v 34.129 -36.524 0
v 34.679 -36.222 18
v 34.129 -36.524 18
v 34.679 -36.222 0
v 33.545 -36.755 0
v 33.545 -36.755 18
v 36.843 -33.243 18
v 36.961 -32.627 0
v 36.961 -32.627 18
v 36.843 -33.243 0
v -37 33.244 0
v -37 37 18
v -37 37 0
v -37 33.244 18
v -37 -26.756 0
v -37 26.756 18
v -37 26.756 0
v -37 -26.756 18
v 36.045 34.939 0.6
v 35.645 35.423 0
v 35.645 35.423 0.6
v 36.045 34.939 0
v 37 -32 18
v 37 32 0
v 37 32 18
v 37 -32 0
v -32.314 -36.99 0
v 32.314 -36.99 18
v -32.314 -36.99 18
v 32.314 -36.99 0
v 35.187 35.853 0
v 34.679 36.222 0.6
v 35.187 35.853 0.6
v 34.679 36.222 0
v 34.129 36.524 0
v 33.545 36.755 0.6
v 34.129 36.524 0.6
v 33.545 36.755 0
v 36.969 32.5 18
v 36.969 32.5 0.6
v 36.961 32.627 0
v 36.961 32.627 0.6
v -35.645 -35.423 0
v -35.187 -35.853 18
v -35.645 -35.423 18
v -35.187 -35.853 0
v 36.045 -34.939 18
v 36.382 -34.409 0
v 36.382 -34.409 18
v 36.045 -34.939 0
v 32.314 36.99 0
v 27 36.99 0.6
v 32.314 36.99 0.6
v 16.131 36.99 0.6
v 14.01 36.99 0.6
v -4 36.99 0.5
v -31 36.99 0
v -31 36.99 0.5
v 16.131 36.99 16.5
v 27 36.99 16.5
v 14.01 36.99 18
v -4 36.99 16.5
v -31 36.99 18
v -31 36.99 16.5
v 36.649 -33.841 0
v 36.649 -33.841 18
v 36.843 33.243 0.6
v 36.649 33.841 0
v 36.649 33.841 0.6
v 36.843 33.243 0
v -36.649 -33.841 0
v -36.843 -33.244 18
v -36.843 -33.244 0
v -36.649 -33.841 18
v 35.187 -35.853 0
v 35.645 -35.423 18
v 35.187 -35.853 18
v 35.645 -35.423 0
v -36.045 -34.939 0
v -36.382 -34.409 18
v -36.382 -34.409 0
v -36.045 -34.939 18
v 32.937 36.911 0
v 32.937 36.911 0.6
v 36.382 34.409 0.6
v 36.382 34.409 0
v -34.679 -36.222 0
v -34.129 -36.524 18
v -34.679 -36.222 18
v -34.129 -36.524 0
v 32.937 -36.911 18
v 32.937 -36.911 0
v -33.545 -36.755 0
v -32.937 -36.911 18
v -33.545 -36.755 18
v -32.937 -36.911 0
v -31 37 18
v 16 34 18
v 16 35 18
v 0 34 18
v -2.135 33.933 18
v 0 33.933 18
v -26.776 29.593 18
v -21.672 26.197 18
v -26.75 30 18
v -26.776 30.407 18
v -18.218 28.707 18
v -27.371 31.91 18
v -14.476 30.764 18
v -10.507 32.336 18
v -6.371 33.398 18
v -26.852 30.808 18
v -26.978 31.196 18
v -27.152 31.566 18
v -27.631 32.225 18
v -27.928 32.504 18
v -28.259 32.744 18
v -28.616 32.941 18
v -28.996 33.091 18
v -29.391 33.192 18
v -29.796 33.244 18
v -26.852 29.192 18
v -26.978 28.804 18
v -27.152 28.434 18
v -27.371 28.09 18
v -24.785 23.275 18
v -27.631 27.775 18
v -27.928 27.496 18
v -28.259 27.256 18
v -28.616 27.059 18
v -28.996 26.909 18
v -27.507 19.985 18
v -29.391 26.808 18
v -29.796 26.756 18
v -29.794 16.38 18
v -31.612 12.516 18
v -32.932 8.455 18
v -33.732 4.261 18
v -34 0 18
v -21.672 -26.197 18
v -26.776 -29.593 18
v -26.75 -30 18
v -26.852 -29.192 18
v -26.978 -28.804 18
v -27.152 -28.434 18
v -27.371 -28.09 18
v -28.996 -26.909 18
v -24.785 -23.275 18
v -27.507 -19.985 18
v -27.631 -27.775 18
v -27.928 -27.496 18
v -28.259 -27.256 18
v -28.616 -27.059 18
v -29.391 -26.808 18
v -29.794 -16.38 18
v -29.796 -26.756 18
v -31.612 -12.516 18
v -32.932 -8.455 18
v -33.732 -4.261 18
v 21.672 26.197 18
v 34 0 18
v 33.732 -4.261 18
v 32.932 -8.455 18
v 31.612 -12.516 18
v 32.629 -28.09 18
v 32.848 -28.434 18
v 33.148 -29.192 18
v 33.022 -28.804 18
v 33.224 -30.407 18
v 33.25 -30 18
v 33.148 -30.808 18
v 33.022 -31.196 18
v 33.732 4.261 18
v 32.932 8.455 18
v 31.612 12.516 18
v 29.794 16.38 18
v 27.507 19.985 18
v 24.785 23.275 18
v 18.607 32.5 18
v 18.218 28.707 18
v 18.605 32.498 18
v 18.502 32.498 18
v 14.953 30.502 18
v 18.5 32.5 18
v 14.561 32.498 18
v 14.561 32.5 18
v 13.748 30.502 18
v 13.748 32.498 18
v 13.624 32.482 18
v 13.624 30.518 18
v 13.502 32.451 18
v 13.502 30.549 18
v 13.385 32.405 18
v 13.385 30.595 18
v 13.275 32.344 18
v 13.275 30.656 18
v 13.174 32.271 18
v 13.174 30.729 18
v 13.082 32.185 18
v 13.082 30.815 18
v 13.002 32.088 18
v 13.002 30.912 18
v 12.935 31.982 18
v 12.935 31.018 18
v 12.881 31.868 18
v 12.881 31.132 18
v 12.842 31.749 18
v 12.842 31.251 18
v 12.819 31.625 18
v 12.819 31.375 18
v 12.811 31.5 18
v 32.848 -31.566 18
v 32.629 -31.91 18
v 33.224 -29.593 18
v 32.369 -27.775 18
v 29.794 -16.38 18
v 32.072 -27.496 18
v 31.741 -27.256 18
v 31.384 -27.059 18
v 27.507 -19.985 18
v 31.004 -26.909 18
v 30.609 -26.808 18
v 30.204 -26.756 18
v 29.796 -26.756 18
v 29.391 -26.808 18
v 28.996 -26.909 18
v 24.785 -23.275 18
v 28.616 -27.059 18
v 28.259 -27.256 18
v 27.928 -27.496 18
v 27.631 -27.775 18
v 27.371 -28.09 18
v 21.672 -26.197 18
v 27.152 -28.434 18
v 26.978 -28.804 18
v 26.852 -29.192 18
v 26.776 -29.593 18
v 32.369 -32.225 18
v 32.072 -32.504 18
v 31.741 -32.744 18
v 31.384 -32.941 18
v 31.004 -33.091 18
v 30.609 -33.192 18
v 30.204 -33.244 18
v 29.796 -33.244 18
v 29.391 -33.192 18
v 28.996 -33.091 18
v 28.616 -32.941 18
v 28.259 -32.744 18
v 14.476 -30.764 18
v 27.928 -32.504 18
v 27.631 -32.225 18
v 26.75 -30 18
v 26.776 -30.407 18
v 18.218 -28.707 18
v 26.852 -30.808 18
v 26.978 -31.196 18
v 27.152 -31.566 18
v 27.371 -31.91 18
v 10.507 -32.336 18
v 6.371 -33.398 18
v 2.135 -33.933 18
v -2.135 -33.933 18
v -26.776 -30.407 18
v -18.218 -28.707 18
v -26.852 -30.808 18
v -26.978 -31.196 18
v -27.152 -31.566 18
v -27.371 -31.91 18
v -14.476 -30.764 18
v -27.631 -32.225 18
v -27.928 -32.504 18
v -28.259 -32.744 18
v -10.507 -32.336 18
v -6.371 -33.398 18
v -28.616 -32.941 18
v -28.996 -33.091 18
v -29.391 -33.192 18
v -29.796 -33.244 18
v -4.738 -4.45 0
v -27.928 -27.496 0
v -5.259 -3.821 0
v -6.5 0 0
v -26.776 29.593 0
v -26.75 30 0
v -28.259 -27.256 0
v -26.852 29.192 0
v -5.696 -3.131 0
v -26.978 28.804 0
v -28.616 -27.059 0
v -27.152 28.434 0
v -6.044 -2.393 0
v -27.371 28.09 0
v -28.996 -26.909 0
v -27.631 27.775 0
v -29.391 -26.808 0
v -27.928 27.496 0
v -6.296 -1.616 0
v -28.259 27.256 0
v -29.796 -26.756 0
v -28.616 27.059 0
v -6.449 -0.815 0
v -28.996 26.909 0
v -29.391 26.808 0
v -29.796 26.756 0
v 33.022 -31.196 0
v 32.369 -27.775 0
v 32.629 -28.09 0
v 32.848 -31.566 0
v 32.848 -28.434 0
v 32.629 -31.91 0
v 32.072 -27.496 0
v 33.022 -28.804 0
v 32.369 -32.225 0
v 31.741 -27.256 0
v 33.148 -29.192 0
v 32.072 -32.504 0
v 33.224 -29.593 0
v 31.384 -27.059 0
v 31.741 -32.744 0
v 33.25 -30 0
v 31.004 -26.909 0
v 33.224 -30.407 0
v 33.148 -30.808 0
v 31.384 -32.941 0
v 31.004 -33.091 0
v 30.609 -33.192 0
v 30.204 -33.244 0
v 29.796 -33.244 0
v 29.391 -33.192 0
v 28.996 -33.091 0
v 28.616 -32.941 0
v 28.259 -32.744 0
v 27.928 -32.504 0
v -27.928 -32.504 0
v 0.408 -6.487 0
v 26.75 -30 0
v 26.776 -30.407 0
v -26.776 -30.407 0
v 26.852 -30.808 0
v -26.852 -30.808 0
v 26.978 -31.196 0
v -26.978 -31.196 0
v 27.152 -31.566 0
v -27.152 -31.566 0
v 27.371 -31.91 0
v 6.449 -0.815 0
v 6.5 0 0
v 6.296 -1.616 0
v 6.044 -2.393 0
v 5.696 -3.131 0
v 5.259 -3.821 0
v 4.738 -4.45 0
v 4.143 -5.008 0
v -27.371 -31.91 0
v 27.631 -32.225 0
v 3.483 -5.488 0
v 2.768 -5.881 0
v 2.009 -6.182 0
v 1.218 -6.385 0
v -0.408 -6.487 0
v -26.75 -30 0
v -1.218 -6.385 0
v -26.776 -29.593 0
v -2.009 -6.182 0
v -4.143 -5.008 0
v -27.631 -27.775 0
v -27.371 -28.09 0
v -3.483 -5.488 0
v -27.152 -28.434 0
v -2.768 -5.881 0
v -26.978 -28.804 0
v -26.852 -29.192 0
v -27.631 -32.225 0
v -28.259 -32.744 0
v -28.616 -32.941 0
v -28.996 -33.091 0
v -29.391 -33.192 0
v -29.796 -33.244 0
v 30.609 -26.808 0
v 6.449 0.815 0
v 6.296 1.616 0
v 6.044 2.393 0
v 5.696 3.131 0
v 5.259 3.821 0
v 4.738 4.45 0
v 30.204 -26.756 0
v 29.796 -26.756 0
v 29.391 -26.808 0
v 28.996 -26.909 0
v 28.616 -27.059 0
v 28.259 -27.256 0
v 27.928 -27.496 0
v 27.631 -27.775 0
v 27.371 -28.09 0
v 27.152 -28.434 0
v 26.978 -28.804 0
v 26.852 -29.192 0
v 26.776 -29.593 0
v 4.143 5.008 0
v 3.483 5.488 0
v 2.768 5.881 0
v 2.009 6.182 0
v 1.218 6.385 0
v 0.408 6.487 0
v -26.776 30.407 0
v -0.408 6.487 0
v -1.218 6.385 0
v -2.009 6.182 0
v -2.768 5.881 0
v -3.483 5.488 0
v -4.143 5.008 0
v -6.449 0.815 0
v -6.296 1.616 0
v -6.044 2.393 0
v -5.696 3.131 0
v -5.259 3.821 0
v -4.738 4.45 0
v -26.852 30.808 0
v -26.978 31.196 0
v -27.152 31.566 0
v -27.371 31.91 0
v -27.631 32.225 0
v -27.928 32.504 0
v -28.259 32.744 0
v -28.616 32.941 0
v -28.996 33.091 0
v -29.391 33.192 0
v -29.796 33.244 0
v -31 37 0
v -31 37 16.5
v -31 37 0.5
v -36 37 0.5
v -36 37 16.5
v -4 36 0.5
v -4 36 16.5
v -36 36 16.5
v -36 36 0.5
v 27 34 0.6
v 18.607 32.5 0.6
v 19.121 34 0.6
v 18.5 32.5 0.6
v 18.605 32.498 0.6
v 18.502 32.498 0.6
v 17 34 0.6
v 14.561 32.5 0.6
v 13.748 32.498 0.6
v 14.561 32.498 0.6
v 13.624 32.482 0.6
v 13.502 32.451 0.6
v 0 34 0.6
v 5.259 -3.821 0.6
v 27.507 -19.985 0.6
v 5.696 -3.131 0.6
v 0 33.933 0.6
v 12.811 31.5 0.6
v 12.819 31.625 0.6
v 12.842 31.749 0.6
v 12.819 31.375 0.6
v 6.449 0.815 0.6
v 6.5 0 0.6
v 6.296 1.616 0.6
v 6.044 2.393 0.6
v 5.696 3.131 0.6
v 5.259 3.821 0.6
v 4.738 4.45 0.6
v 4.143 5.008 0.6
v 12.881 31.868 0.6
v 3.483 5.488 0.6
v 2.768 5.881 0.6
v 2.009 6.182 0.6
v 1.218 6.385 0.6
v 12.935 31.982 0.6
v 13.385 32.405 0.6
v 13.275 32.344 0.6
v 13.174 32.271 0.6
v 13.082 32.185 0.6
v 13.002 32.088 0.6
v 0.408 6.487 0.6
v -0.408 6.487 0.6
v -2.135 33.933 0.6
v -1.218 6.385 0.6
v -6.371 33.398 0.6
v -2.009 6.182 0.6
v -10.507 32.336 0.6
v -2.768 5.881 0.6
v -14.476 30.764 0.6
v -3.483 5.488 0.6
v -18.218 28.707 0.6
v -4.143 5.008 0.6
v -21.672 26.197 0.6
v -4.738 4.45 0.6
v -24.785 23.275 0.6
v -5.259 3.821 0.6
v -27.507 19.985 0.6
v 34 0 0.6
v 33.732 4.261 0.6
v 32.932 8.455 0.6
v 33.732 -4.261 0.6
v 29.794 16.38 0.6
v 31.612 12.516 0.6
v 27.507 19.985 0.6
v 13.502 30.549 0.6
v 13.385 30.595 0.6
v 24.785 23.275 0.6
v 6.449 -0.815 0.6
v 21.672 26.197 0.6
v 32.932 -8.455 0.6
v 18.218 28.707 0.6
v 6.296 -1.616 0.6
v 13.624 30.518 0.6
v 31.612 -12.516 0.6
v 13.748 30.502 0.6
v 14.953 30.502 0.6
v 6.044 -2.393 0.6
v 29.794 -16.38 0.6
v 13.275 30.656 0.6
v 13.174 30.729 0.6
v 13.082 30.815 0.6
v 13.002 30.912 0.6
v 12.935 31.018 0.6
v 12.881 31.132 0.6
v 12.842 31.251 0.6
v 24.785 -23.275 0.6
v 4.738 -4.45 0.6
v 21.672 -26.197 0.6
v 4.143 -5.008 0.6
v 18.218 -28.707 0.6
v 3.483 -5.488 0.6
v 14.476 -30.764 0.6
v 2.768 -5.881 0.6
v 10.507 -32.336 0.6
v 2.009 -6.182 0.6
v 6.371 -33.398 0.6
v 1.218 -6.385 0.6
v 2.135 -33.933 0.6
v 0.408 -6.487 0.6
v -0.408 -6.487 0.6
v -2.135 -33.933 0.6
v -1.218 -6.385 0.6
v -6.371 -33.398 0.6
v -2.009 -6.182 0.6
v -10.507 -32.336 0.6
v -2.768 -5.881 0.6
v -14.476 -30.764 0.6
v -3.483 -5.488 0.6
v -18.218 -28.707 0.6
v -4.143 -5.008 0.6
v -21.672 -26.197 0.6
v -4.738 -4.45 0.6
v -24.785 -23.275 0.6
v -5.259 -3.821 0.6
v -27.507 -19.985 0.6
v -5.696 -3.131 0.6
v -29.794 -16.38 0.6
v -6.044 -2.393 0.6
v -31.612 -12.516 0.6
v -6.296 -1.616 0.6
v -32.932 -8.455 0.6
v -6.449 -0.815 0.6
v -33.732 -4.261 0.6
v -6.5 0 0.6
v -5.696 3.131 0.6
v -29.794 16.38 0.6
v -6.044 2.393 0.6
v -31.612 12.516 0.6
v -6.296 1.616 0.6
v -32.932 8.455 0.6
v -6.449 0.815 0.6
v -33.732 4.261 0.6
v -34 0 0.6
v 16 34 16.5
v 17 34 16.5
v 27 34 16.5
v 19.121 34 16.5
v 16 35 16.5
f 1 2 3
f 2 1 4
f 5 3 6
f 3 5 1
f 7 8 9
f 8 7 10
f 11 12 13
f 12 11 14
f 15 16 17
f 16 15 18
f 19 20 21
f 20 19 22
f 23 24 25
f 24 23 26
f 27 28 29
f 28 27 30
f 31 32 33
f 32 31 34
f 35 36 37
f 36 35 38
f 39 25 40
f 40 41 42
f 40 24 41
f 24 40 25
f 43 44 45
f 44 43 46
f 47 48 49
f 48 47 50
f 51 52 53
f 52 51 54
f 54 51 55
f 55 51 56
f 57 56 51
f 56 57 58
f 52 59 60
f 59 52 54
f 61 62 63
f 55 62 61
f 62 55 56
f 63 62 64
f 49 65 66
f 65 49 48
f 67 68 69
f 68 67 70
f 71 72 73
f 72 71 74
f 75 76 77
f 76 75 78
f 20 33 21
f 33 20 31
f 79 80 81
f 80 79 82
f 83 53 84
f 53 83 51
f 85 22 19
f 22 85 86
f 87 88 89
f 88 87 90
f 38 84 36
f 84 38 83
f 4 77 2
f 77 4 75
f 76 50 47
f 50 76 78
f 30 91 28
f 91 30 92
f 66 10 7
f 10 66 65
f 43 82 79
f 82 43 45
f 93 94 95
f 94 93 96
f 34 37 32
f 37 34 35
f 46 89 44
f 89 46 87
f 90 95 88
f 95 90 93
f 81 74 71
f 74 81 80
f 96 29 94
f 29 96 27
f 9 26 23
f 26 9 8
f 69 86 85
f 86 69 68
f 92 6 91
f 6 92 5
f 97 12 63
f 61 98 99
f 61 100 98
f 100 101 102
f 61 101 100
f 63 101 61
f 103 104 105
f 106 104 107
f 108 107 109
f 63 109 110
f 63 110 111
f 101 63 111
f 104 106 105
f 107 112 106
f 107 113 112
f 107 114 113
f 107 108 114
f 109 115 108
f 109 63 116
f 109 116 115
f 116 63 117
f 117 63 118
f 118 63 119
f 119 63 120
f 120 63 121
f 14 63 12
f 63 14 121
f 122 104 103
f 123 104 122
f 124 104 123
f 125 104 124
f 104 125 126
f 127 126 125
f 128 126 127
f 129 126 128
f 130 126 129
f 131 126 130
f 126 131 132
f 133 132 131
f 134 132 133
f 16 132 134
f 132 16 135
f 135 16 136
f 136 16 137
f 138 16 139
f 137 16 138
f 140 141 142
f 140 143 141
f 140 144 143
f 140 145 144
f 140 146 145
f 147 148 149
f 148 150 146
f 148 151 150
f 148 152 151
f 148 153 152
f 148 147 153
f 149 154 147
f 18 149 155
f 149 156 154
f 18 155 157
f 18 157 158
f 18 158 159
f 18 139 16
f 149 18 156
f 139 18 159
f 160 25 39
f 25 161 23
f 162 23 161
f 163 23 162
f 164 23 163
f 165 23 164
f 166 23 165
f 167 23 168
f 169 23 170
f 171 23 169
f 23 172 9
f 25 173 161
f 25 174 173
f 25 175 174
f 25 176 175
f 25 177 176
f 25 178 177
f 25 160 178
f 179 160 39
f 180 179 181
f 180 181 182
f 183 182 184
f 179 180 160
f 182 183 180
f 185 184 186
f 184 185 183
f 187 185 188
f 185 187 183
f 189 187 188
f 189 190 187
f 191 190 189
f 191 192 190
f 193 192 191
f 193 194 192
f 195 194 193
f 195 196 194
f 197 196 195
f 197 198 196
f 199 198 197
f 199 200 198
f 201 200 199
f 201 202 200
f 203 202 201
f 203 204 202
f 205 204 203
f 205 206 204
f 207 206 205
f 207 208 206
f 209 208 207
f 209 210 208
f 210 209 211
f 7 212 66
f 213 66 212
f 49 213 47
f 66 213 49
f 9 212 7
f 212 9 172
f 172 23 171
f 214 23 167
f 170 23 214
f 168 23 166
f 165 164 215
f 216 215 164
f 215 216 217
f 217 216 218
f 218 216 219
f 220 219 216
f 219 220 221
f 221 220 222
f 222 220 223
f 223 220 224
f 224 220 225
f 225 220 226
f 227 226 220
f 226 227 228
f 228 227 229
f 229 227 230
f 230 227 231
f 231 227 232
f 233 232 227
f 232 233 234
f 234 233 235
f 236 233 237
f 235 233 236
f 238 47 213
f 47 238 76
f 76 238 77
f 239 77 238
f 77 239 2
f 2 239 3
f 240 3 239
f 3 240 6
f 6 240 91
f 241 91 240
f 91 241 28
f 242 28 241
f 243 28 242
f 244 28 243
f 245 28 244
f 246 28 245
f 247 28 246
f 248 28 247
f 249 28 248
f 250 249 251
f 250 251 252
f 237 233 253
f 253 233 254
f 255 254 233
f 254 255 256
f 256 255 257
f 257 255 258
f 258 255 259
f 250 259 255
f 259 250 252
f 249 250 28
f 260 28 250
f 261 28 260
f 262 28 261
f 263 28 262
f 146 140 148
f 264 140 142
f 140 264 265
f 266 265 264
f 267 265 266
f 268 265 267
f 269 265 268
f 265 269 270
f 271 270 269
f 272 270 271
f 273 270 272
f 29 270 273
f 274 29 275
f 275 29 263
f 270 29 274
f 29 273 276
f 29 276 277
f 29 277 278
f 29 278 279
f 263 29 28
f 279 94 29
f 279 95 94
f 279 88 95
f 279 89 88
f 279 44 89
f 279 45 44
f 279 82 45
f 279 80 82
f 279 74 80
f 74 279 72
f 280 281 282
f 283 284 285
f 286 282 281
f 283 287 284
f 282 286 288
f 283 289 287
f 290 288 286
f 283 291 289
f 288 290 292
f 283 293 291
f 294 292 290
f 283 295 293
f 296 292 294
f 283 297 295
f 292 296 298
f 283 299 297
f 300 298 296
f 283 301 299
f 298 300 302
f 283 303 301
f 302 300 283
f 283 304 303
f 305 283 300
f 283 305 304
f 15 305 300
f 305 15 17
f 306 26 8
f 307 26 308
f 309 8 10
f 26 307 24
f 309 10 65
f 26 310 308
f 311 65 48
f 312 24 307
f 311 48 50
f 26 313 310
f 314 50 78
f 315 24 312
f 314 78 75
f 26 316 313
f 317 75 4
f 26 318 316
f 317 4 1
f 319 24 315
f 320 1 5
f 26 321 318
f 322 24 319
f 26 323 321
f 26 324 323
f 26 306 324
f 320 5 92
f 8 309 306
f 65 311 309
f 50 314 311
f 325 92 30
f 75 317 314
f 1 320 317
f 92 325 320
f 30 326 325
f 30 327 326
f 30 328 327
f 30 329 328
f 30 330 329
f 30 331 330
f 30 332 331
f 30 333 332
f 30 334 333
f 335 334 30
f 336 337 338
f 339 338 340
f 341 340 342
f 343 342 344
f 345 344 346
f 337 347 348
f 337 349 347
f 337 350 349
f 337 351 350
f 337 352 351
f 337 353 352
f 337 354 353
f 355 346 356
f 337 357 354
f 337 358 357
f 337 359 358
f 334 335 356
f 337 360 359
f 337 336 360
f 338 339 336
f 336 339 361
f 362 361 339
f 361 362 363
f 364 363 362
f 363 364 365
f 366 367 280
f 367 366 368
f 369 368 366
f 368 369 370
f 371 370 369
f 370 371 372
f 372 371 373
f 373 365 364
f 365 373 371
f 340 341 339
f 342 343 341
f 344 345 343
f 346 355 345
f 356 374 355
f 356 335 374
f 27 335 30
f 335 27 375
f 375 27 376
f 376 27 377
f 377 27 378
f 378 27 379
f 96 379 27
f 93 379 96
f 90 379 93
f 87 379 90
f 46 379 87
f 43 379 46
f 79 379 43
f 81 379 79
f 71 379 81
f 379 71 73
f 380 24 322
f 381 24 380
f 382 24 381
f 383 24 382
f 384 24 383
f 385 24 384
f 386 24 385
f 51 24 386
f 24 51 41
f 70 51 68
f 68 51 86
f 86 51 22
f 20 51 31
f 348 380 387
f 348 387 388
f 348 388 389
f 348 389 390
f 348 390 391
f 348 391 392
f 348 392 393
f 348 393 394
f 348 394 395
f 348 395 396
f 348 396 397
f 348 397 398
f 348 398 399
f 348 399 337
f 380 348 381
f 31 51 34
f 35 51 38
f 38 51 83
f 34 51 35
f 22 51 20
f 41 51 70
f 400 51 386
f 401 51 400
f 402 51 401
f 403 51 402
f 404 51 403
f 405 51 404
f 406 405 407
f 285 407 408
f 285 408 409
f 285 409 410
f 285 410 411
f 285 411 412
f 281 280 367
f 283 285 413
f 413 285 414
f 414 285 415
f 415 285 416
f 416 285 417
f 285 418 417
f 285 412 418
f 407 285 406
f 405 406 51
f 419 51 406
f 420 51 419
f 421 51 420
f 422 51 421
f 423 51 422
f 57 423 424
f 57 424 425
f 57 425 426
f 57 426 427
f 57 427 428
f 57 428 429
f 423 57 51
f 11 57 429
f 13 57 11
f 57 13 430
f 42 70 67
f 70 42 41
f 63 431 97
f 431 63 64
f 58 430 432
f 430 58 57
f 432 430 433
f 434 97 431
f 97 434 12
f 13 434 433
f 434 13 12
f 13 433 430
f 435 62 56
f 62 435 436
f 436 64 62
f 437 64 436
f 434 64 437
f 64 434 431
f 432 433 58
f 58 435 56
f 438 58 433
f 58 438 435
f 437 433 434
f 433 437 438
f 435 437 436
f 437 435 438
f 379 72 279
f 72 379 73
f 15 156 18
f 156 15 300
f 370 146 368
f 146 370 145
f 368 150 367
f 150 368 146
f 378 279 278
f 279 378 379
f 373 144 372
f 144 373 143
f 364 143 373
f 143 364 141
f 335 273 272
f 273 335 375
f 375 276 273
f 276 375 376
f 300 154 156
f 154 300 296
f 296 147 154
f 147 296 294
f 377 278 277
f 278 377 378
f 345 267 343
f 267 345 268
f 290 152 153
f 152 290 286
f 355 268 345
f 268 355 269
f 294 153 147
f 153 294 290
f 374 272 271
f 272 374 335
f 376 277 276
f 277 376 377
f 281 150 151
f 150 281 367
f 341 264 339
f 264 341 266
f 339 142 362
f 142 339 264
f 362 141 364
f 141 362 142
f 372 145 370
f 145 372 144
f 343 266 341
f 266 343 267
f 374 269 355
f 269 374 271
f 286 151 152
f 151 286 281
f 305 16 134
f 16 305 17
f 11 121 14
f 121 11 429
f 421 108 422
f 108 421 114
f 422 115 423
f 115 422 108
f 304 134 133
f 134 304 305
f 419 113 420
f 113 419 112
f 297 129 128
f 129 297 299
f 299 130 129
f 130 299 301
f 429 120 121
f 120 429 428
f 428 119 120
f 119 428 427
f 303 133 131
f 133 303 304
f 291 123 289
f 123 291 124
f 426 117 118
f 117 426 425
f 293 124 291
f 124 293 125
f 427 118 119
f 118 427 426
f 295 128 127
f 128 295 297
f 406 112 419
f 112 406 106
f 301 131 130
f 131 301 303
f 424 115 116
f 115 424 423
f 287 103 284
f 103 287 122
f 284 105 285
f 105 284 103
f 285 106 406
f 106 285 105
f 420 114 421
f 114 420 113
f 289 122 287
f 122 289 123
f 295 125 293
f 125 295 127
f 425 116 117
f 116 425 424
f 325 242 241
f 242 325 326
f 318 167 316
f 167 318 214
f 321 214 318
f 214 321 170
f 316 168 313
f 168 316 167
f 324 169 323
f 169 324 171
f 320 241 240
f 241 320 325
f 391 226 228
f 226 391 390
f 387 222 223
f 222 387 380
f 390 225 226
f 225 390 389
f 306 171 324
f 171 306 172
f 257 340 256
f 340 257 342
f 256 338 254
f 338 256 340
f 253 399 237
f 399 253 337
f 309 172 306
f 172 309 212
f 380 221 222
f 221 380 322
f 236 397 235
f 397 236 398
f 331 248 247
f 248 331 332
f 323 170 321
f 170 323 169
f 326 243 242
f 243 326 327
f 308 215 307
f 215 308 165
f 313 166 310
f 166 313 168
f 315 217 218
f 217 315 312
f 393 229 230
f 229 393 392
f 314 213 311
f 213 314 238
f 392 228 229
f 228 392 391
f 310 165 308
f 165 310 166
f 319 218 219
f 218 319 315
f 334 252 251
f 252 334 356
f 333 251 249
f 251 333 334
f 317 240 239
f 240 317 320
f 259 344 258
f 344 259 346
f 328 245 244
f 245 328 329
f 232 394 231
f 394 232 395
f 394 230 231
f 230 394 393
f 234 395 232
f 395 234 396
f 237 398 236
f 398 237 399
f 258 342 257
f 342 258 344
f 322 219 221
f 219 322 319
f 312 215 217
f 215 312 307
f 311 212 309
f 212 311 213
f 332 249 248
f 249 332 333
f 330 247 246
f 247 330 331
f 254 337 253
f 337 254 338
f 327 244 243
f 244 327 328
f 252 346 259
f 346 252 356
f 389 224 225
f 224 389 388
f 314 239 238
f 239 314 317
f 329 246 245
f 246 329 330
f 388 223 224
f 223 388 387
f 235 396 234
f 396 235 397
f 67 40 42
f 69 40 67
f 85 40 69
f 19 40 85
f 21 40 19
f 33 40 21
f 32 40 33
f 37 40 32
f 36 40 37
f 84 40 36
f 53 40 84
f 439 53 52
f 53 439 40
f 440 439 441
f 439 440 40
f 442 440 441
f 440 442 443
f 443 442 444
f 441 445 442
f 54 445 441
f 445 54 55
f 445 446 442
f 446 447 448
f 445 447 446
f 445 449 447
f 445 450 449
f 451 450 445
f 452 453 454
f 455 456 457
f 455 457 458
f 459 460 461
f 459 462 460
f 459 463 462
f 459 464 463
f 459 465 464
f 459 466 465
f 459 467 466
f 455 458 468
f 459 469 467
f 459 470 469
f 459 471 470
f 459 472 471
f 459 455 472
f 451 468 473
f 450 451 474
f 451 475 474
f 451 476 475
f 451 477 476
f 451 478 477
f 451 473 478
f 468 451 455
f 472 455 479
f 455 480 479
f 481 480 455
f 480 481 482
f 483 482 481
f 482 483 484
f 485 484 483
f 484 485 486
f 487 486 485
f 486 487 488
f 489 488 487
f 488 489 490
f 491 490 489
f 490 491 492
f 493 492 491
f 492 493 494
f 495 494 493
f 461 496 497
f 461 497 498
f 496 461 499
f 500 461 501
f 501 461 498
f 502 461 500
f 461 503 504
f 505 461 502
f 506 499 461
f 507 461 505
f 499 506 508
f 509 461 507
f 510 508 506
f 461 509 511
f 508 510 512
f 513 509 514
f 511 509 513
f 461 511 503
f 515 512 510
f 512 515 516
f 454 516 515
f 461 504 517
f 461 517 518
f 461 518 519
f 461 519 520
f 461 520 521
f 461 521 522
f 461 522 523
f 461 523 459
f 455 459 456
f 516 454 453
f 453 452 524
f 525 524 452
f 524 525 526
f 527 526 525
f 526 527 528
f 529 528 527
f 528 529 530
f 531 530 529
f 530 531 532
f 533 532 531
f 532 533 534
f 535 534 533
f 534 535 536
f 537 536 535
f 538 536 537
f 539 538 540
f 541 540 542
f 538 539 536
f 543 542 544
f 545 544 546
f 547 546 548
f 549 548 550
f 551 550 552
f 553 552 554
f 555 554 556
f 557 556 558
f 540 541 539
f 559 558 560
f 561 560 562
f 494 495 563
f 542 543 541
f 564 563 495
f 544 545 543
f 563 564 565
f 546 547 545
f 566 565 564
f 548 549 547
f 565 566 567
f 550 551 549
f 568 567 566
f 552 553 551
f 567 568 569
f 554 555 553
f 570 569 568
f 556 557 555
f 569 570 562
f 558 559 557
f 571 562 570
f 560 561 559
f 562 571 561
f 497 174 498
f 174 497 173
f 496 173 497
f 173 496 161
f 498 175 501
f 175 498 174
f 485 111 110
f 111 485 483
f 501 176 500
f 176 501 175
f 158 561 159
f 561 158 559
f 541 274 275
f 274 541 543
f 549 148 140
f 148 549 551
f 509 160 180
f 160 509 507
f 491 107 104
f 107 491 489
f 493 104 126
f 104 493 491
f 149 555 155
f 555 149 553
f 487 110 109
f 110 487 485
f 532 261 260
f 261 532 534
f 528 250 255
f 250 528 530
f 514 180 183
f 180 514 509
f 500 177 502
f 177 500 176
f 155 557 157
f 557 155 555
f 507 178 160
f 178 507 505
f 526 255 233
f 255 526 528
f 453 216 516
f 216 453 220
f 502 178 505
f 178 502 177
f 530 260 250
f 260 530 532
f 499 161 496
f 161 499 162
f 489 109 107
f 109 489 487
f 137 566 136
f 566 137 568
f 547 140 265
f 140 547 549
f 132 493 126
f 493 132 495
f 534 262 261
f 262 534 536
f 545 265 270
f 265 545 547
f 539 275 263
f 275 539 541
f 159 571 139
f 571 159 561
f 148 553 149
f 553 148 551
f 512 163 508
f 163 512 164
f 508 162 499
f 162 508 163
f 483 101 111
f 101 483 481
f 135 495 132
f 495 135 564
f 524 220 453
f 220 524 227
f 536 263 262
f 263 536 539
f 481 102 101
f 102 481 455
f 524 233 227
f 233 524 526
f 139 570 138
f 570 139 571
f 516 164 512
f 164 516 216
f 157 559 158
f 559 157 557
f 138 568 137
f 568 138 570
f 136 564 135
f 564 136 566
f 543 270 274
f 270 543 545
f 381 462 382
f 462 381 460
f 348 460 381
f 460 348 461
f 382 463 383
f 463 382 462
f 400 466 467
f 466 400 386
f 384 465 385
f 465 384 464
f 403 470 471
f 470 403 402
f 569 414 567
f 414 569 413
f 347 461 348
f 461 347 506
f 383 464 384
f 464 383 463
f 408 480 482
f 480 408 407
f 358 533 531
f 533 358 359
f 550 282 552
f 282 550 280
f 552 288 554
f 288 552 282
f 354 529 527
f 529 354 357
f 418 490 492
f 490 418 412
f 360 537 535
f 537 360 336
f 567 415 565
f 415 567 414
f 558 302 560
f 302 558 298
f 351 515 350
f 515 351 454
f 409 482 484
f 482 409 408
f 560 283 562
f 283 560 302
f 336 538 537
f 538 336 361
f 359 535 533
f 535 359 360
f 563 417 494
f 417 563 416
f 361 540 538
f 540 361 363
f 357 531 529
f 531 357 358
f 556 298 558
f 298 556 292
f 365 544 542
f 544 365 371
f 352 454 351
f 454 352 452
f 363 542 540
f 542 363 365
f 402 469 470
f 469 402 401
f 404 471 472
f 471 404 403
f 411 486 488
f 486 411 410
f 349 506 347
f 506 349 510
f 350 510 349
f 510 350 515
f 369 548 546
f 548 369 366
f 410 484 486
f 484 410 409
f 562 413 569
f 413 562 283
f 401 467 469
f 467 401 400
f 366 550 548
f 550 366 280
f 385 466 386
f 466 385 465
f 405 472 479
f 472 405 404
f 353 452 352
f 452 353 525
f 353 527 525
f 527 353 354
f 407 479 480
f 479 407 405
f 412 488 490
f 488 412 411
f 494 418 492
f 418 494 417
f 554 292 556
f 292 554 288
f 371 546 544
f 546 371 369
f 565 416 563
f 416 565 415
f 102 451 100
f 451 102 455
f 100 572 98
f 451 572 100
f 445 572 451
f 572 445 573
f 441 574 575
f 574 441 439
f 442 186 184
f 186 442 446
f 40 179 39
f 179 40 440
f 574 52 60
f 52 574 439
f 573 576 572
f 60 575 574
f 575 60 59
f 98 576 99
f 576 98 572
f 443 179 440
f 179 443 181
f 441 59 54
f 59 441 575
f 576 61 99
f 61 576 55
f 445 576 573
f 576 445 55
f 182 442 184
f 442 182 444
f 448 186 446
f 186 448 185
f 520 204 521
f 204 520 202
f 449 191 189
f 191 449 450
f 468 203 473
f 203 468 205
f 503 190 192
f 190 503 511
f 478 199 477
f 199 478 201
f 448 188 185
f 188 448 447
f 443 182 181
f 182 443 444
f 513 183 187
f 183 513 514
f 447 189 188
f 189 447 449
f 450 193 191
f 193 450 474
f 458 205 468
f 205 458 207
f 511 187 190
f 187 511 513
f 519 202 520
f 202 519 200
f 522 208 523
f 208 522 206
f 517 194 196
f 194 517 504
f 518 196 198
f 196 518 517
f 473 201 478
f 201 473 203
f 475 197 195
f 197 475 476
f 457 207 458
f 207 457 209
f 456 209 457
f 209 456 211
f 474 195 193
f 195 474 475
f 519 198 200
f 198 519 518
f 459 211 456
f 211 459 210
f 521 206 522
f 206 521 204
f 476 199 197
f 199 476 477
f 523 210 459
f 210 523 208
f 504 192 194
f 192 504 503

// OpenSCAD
$fn = 50;


union() {
	difference() {
		union() {
			translate(v = [0, 0, 0]) {
				rotate(a = [0, 0, 0]) {
					hull() {
						translate(v = [-32.0000000000, 32.0000000000, 0]) {
							rotate(a = [0, 0, 0]) {
								translate(v = [0, 0, 0]) {
									rotate(a = [0, 0, 0]) {
										cylinder(h = 18, r = 5);
									}
								}
							}
						}
						translate(v = [32.0000000000, 32.0000000000, 0]) {
							rotate(a = [0, 0, 0]) {
								translate(v = [0, 0, 0]) {
									rotate(a = [0, 0, 0]) {
										cylinder(h = 18, r = 5);
									}
								}
							}
						}
						translate(v = [-32.0000000000, -32.0000000000, 0]) {
							rotate(a = [0, 0, 0]) {
								translate(v = [0, 0, 0]) {
									rotate(a = [0, 0, 0]) {
										cylinder(h = 18, r = 5);
									}
								}
							}
						}
						translate(v = [32.0000000000, -32.0000000000, 0]) {
							rotate(a = [0, 0, 0]) {
								translate(v = [0, 0, 0]) {
									rotate(a = [0, 0, 0]) {
										cylinder(h = 18, r = 5);
									}
								}
							}
						}
					}
				}
			}
			translate(v = [-37.0000000000, 31.0000000000, 0]) {
				rotate(a = [0, 0, 0]) {
					cube(size = [6, 6, 18]);
				}
			}
		}
		union() {
			#translate(v = [-36.0000000000, 36.0000000000, 0.5000000000]) {
				rotate(a = [0, 0, 0]) {
					cube(size = [32, 1, 16]);
				}
			}
			translate(v = [-37.5000000000, -30.0000000000, -125]) {
				rotate(a = [0, 0, 0]) {
					hull() {
						translate(v = [7.5000000000, 0, 0]) {
							rotate(a = [0, 0, 0]) {
								translate(v = [0, 0, 0]) {
									rotate(a = [0, 0, 0]) {
										cylinder(h = 250, r = 3.2500000000);
									}
								}
							}
						}
						translate(v = [-7.5000000000, 0, 0]) {
							rotate(a = [0, 0, 0]) {
								translate(v = [0, 0, 0]) {
									rotate(a = [0, 0, 0]) {
										cylinder(h = 250, r = 3.2500000000);
									}
								}
							}
						}
					}
				}
			}
			translate(v = [-37.5000000000, 30.0000000000, -125]) {
				rotate(a = [0, 0, 0]) {
					hull() {
						translate(v = [7.5000000000, 0, 0]) {
							rotate(a = [0, 0, 0]) {
								translate(v = [0, 0, 0]) {
									rotate(a = [0, 0, 0]) {
										cylinder(h = 250, r = 3.2500000000);
									}
								}
							}
						}
						translate(v = [-7.5000000000, 0, 0]) {
							rotate(a = [0, 0, 0]) {
								translate(v = [0, 0, 0]) {
									rotate(a = [0, 0, 0]) {
										cylinder(h = 250, r = 3.2500000000);
									}
								}
							}
						}
					}
				}
			}
			translate(v = [30.0000000000, -30.0000000000, -125.0000000000]) {
				rotate(a = [0, 0, 0]) {
					cylinder(h = 250, r = 3.2500000000);
				}
			}
			translate(v = [0, 0, 0.6000000000]) {
				rotate(a = [0, 0, 0]) {
					cylinder(h = 20.4000000000, r = 34.0000000000);
				}
			}
			translate(v = [0, 0, -9.0000000000]) {
				rotate(a = [0, 0, 0]) {
					cylinder(h = 18, r = 6.5000000000);
				}
			}
			translate(v = [0.0000000000, 32.5000000000, 0.6000000000]) {
				rotate(a = [0, 0, 0]) {
					cube(size = [37.0000000000, 1.5000000000, 20.4000000000]);
				}
			}
			translate(v = [27.0000000000, 32.5000000000, 0.6000000000]) {
				rotate(a = [0, 0, 0]) {
					cube(size = [10, 4.5000000000, 20.4000000000]);
				}
			}
			translate(v = [16.0000000000, 32.5000000000, 16.5000000000]) {
				rotate(a = [0, 0, 0]) {
					cube(size = [21, 4.5000000000, 1.5000000000]);
				}
			}
			translate(v = [13.2500000000, 37.7500000000, 0.6000000000]) {
				rotate(a = [0, 0, -45]) {
					cube(size = [7.5000000000, 1.5000000000, 20.4000000000]);
				}
			}
			translate(v = [7.0610000000, 30.5000000000, 0.6000000000]) {
				rotate(a = [0, 0, 0]) {
					cube(size = [7.5000000000, 2, 17.4000000000]);
				}
			}
		}
	}
	union() {
		translate(v = [16.3110000000, 31.5000000000, 0]) {
			rotate(a = [0, 0, 0]) {
				hull() {
					translate(v = [2.5000000000, 0, 0]) {
						rotate(a = [0, 0, 0]) {
							#translate(v = [0, 0, 0]) {
								rotate(a = [0, 0, 0]) {
									cylinder(h = 18, r = 1.0000000000);
								}
							}
						}
					}
					translate(v = [-2.5000000000, 0, 0]) {
						rotate(a = [0, 0, 0]) {
							#translate(v = [0, 0, 0]) {
								rotate(a = [0, 0, 0]) {
									cylinder(h = 18, r = 1.0000000000);
								}
							}
						}
					}
				}
			}
		}
	}
}
